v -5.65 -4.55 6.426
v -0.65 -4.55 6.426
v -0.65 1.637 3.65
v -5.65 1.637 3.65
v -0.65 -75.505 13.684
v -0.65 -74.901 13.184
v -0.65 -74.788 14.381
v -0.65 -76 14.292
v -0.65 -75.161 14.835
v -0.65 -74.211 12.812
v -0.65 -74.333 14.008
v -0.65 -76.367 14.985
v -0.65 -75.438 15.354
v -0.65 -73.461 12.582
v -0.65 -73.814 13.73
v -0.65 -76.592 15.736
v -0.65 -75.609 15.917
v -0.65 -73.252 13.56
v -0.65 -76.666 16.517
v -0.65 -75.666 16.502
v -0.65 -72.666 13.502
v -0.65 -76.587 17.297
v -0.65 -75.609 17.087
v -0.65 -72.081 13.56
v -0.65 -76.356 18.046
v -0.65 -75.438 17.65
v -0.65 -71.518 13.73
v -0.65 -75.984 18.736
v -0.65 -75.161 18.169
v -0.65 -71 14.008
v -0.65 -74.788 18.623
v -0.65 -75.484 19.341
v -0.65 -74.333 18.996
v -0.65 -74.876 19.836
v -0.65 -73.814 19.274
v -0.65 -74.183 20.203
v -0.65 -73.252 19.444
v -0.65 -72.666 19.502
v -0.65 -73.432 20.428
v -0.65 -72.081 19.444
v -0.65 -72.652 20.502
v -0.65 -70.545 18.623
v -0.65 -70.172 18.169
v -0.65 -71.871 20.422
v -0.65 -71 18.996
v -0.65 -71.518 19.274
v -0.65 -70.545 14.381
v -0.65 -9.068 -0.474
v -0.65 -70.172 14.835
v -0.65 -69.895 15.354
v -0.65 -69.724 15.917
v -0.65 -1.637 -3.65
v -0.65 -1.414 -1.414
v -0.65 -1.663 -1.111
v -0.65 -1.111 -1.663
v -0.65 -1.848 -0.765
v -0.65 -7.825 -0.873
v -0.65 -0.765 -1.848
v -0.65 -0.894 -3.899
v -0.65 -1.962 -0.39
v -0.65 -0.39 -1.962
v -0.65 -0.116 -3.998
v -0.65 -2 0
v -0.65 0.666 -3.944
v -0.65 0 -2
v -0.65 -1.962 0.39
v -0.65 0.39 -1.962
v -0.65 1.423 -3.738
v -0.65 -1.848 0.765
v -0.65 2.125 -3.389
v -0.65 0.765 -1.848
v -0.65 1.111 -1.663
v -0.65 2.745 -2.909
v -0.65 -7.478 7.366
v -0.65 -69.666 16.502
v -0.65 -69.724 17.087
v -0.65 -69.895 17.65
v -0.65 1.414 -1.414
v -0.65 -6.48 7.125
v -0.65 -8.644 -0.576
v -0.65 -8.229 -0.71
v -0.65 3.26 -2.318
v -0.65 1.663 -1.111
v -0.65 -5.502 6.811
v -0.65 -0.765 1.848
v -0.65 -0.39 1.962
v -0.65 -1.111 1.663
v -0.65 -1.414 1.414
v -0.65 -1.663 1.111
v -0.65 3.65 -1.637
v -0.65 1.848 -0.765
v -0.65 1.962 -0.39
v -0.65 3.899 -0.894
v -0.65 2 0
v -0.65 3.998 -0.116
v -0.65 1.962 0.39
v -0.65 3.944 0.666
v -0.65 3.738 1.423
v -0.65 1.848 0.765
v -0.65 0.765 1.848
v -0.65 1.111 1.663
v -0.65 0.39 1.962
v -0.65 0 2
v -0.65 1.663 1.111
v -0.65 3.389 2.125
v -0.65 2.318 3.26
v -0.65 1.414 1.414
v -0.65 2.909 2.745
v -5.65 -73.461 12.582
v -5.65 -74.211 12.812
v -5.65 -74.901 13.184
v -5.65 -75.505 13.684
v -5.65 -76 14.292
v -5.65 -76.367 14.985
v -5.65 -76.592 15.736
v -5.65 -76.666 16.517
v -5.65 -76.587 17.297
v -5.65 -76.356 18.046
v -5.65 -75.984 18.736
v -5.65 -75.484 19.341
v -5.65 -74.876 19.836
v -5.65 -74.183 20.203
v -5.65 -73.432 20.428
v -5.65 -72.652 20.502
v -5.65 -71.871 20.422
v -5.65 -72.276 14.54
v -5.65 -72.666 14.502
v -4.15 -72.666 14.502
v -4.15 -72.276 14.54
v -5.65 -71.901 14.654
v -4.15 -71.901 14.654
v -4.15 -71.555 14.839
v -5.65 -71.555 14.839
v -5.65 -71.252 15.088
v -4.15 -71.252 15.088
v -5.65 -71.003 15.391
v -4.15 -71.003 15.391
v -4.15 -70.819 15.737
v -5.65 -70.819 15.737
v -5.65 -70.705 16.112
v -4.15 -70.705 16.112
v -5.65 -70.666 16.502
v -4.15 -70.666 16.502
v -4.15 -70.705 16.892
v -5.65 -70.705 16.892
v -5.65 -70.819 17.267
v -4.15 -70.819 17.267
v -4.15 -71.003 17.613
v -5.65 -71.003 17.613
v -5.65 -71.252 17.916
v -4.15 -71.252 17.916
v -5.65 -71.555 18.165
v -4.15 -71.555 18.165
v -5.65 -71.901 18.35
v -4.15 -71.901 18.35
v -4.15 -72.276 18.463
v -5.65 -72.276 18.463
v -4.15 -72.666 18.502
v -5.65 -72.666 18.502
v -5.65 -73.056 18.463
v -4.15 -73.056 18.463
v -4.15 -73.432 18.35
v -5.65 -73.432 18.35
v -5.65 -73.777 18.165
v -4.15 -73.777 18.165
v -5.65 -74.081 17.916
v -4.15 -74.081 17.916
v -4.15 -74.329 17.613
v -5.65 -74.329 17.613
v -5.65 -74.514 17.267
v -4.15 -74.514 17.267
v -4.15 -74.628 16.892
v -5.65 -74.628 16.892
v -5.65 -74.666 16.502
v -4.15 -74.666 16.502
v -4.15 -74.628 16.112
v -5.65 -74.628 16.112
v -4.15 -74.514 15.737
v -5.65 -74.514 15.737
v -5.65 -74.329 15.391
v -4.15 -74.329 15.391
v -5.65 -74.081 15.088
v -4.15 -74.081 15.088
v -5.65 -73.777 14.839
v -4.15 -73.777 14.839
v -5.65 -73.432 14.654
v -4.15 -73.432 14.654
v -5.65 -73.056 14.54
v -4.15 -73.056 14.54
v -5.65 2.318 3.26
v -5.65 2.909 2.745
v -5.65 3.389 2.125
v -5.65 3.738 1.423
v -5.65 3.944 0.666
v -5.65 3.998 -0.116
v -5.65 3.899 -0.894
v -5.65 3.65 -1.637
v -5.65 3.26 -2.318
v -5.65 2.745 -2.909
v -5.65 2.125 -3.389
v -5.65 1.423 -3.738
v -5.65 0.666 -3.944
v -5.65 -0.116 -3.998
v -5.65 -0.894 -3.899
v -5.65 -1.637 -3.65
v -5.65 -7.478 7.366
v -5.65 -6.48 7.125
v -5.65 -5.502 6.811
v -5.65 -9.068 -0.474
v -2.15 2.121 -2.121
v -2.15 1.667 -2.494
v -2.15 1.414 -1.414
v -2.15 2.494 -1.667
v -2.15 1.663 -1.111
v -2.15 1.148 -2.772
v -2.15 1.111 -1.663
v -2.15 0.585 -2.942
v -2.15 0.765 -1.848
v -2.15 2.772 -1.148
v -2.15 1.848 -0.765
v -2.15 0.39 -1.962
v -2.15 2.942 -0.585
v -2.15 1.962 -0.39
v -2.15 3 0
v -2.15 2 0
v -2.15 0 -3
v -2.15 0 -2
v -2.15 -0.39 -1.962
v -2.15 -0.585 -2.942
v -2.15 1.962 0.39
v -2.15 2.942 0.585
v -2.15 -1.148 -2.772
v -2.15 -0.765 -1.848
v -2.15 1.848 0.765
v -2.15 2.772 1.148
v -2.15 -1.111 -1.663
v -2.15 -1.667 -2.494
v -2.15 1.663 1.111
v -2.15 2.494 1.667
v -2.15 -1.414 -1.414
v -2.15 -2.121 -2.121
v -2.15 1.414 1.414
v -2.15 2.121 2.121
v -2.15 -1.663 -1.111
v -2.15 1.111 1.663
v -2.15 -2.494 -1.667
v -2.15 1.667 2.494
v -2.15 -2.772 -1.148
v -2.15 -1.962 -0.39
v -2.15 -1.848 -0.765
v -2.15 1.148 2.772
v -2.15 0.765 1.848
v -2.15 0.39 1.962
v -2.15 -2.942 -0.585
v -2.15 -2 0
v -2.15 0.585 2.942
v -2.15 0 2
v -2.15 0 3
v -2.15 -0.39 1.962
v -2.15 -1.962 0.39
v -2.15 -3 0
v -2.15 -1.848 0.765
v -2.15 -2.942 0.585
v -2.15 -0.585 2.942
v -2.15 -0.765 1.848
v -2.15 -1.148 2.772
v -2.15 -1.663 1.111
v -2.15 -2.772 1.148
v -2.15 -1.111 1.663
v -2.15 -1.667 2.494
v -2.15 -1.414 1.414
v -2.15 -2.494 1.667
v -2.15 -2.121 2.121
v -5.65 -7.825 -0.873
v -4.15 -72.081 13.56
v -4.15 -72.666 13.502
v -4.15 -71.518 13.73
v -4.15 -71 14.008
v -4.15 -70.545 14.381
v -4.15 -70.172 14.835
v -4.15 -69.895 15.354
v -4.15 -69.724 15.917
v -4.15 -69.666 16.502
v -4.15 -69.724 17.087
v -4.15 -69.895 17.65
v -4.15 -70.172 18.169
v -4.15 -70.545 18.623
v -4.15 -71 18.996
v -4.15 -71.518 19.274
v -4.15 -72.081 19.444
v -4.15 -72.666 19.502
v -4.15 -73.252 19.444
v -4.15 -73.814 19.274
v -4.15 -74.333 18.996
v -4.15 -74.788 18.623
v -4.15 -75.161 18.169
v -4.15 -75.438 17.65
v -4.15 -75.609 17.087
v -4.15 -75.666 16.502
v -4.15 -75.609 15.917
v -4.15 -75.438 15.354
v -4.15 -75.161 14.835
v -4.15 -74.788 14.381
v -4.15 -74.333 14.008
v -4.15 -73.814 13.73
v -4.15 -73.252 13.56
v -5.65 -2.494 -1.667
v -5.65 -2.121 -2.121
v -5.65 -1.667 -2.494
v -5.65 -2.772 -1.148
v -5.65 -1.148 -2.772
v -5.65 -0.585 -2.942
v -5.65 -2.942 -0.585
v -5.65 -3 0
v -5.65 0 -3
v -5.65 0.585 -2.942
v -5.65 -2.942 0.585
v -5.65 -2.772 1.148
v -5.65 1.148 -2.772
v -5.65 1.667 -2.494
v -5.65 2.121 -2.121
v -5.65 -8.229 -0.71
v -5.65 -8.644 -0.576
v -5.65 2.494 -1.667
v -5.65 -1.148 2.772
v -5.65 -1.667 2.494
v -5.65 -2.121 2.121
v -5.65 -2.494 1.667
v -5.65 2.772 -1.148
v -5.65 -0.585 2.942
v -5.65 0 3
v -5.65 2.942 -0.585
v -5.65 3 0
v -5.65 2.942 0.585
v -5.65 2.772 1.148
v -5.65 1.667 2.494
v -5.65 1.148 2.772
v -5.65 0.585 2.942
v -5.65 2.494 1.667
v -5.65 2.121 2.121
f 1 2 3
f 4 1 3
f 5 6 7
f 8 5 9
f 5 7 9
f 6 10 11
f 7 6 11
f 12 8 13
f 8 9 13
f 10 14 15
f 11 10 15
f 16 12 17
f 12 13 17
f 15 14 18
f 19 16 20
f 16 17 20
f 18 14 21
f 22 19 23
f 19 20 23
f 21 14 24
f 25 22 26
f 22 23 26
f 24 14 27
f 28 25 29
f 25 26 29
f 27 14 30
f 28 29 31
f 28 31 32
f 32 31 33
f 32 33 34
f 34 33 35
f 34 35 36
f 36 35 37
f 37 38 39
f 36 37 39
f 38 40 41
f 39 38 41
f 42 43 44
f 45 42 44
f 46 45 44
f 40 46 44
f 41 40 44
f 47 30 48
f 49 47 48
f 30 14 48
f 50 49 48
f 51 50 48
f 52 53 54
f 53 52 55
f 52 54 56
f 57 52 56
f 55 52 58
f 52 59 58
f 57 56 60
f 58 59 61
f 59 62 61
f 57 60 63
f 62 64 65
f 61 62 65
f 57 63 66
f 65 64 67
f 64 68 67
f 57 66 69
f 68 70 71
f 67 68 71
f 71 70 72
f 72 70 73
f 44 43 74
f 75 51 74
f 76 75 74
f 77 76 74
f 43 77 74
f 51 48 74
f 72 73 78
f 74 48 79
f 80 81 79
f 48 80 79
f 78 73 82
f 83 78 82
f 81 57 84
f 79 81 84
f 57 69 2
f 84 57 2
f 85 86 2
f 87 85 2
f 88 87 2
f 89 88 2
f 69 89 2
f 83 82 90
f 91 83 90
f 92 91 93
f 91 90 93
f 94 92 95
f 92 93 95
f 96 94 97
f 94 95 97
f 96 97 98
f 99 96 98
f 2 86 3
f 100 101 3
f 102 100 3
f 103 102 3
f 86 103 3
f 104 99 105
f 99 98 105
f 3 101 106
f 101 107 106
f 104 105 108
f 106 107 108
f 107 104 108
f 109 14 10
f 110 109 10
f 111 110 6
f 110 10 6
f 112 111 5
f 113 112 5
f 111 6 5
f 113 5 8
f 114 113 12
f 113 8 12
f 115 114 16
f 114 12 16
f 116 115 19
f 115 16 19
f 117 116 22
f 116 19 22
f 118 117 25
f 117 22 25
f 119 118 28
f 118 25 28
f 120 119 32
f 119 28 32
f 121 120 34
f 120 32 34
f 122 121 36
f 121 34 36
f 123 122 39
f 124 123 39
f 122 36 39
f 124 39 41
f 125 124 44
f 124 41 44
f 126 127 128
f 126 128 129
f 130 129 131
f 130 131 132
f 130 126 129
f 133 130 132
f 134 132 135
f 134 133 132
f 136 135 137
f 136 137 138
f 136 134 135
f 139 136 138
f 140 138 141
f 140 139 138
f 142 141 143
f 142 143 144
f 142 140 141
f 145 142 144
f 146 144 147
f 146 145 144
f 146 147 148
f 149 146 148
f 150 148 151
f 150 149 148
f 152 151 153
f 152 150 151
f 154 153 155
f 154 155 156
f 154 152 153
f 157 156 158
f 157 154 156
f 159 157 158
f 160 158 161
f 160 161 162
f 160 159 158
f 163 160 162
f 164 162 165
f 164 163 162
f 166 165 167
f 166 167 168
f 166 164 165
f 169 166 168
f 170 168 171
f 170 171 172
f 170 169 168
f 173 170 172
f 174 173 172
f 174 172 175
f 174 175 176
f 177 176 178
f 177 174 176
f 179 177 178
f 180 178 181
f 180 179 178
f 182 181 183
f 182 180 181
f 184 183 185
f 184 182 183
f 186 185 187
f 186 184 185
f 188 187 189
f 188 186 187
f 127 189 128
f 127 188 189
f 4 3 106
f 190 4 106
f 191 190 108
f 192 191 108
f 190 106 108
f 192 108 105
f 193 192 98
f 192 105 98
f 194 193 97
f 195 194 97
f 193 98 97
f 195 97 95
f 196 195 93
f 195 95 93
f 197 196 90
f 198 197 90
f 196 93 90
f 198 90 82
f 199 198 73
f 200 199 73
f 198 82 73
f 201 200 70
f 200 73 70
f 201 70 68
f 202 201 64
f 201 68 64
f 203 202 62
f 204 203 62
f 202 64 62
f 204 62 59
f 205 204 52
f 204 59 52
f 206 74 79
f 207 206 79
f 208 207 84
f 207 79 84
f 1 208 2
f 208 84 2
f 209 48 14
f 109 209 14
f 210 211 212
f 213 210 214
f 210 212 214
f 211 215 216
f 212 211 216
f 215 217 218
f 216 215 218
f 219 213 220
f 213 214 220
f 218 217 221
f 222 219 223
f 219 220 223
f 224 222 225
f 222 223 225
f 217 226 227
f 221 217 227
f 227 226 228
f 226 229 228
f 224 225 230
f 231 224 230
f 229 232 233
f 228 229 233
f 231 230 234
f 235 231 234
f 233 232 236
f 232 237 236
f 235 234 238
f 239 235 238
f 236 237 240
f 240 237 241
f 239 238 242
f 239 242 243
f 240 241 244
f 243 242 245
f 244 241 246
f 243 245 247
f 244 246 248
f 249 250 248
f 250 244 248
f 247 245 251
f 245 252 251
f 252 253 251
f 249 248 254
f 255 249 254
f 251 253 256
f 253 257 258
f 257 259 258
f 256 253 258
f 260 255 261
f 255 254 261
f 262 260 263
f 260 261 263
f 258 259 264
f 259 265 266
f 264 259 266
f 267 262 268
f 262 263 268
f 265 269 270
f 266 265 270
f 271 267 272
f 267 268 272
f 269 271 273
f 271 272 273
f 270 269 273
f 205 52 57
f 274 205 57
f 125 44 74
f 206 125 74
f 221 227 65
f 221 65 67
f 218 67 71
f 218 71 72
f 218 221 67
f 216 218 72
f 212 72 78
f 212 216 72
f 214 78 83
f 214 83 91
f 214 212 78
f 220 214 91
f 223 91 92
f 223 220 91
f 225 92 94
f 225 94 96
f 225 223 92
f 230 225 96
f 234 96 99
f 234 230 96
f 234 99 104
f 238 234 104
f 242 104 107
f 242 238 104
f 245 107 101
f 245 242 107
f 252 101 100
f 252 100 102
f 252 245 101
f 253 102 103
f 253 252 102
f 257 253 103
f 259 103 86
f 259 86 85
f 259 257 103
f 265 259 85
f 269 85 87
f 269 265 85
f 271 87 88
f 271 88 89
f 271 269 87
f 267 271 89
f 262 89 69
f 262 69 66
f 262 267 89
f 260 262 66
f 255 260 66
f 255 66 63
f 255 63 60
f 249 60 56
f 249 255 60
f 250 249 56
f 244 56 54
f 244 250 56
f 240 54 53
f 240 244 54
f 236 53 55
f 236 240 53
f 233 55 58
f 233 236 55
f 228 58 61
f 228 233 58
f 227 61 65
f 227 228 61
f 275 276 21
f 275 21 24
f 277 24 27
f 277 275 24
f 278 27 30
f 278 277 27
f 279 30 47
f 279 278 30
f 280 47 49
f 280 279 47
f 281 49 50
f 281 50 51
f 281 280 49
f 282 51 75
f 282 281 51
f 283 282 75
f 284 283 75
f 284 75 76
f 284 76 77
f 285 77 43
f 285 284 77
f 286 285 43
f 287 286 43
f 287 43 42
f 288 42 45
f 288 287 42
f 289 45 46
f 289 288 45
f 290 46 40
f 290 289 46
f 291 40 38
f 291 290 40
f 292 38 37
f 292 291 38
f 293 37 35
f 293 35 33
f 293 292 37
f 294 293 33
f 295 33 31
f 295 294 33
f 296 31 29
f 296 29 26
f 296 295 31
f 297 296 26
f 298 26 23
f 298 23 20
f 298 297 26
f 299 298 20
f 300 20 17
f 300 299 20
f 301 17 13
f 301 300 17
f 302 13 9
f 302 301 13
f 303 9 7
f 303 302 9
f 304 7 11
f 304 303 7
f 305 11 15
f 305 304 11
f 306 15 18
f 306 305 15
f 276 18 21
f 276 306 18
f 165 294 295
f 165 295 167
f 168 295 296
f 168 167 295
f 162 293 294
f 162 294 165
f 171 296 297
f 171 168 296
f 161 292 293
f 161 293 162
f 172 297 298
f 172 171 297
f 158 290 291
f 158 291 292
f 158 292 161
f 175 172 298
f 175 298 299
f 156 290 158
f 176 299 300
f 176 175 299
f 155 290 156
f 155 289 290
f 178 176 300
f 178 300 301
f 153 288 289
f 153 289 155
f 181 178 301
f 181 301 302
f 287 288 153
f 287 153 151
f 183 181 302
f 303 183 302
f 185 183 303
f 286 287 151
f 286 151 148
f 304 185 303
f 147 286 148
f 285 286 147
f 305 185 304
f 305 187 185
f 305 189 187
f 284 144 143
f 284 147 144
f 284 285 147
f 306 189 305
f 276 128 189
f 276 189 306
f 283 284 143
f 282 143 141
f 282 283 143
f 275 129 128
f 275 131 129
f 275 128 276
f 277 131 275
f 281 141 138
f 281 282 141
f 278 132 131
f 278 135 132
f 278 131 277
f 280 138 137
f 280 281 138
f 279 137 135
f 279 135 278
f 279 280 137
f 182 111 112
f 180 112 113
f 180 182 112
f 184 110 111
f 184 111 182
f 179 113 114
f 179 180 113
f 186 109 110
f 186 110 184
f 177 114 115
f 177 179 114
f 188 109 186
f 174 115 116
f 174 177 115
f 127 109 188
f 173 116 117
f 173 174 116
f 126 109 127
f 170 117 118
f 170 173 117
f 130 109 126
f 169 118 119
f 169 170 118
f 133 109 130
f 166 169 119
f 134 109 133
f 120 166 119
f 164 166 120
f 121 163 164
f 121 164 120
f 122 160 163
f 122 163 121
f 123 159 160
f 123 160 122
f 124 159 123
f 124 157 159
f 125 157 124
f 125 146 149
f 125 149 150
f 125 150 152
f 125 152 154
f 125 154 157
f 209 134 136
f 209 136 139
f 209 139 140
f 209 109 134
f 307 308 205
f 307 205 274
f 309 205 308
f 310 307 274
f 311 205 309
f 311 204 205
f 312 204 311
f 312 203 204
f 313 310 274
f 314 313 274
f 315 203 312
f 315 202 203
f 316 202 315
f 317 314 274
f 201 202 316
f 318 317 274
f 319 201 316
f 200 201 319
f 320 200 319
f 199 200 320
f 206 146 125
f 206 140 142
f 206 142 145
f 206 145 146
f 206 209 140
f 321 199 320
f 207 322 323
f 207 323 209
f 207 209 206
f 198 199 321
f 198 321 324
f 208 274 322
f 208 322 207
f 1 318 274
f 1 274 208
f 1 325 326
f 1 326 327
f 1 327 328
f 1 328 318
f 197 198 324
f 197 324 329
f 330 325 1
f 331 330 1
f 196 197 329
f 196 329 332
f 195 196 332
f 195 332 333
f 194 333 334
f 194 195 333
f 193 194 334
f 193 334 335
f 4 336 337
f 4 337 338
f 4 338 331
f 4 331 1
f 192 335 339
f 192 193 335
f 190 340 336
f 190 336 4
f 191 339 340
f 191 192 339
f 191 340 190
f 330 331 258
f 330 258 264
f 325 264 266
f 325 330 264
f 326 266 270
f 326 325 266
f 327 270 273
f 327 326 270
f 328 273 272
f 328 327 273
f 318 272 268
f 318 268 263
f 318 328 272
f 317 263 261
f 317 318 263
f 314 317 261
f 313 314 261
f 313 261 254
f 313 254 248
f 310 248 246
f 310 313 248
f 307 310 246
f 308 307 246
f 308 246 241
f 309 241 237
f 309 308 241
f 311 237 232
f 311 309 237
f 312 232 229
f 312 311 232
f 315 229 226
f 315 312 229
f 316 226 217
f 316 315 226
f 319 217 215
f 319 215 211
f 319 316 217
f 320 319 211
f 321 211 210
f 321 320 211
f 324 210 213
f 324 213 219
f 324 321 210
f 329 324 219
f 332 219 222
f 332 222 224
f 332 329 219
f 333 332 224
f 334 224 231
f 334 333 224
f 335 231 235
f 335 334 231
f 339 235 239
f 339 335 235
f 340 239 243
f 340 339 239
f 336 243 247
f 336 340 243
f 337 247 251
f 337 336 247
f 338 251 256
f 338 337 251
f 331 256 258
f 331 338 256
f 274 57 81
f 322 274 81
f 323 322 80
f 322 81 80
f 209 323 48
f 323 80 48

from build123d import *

# Parameters (mm, degrees)
BOSS_EXTRUDE1_START = -0.65
BOSS_EXTRUDE1_DEPTH = 5
CUT_EXTRUDE1_START  = -5.65
SKETCH2_3_R         = 3
SKETCH2_3_R_2       = 2
CUT_EXTRUDE1_DEPTH  = 3.5
CUT_EXTRUDE2_START  = -2.15
SKETCH2_4_R         = 2
CUT_EXTRUDE2_DEPTH  = 1.5
CUT_EXTRUDE3_START  = -4.15
SKETCH2_5_R         = 3
CUT_EXTRUDE3_DEPTH  = 3.5
CUT_EXTRUDE4_START  = -5.65
SKETCH2_6_R         = 2
CUT_EXTRUDE4_DEPTH  = 1.5


with BuildPart() as part:
    # Sketch2 → Boss-Extrude1 (new body)
    with BuildSketch(Plane(origin=(0, 0, 0), x_dir=(0, 0, -1), z_dir=(1, 0, 0)).offset(BOSS_EXTRUDE1_START)):
        with BuildLine():
            Line((0.474149458, -9.067560136), (-12.581681775, -73.461136983))
            ThreePointArc((-12.581681775, -73.461136983), (-17.296746951, -76.586542619), (-20.422152587, -71.871477443))
            Line((-20.422152587, -71.871477443), (-7.366321354, -7.477900597))
            ThreePointArc((-7.366321354, -7.477900597), (-6.977161002, -5.987839937), (-6.425552448, -4.549975356))
            Line((-6.425552448, -4.549975356), (-3.649510541, 1.637398184))
            ThreePointArc((-3.649510541, 1.637398184), (1.637398184, 3.649510541), (3.649510541, -1.637398184))
            Line((3.649510541, -1.637398184), (0.873468634, -7.824771725))
            ThreePointArc((0.873468634, -7.824771725), (0.639332629, -8.435088345), (0.474149458, -9.067560136))
        make_face()
    extrude(amount=-BOSS_EXTRUDE1_DEPTH)

    # Sketch2<3> → Cut-Extrude1 (cut)
    # profile 1 of 2: a face of its own
    with BuildSketch(Plane(origin=(0, 0, 0), x_dir=(0, 0, -1), z_dir=(1, 0, 0)).offset(CUT_EXTRUDE1_START)):
        with Locations(Location((0, 0, 0), (0, 0, 180))):
            Circle(SKETCH2_3_R)
        Circle(SKETCH2_3_R_2, mode=Mode.SUBTRACT)
    # profile 2 of 2: a face of its own
    with BuildSketch(Plane(origin=(0, 0, 0), x_dir=(0, 0, -1), z_dir=(1, 0, 0)).offset(CUT_EXTRUDE1_START)):
        Circle(SKETCH2_3_R_2)
    extrude(amount=CUT_EXTRUDE1_DEPTH, mode=Mode.SUBTRACT)

    # Sketch2<4> → Cut-Extrude2 (cut)
    with BuildSketch(Plane(origin=(0, 0, 0), x_dir=(0, 0, -1), z_dir=(1, 0, 0)).offset(CUT_EXTRUDE2_START)):
        Circle(SKETCH2_4_R)
    extrude(amount=CUT_EXTRUDE2_DEPTH, mode=Mode.SUBTRACT)

    # Sketch2<5> → Cut-Extrude3 (cut)
    with BuildSketch(Plane(origin=(0, 0, 0), x_dir=(0, 0, -1), z_dir=(1, 0, 0)).offset(CUT_EXTRUDE3_START)):
        with Locations((-16.501917181, -72.666307213)):
            Circle(SKETCH2_5_R)
    extrude(amount=CUT_EXTRUDE3_DEPTH, mode=Mode.SUBTRACT)

    # Sketch2<6> → Cut-Extrude4 (cut)
    with BuildSketch(Plane(origin=(0, 0, 0), x_dir=(0, 0, -1), z_dir=(1, 0, 0)).offset(CUT_EXTRUDE4_START)):
        with Locations((-16.501917181, -72.666307213)):
            Circle(SKETCH2_6_R)
    extrude(amount=CUT_EXTRUDE4_DEPTH, mode=Mode.SUBTRACT)


solid = part.part
